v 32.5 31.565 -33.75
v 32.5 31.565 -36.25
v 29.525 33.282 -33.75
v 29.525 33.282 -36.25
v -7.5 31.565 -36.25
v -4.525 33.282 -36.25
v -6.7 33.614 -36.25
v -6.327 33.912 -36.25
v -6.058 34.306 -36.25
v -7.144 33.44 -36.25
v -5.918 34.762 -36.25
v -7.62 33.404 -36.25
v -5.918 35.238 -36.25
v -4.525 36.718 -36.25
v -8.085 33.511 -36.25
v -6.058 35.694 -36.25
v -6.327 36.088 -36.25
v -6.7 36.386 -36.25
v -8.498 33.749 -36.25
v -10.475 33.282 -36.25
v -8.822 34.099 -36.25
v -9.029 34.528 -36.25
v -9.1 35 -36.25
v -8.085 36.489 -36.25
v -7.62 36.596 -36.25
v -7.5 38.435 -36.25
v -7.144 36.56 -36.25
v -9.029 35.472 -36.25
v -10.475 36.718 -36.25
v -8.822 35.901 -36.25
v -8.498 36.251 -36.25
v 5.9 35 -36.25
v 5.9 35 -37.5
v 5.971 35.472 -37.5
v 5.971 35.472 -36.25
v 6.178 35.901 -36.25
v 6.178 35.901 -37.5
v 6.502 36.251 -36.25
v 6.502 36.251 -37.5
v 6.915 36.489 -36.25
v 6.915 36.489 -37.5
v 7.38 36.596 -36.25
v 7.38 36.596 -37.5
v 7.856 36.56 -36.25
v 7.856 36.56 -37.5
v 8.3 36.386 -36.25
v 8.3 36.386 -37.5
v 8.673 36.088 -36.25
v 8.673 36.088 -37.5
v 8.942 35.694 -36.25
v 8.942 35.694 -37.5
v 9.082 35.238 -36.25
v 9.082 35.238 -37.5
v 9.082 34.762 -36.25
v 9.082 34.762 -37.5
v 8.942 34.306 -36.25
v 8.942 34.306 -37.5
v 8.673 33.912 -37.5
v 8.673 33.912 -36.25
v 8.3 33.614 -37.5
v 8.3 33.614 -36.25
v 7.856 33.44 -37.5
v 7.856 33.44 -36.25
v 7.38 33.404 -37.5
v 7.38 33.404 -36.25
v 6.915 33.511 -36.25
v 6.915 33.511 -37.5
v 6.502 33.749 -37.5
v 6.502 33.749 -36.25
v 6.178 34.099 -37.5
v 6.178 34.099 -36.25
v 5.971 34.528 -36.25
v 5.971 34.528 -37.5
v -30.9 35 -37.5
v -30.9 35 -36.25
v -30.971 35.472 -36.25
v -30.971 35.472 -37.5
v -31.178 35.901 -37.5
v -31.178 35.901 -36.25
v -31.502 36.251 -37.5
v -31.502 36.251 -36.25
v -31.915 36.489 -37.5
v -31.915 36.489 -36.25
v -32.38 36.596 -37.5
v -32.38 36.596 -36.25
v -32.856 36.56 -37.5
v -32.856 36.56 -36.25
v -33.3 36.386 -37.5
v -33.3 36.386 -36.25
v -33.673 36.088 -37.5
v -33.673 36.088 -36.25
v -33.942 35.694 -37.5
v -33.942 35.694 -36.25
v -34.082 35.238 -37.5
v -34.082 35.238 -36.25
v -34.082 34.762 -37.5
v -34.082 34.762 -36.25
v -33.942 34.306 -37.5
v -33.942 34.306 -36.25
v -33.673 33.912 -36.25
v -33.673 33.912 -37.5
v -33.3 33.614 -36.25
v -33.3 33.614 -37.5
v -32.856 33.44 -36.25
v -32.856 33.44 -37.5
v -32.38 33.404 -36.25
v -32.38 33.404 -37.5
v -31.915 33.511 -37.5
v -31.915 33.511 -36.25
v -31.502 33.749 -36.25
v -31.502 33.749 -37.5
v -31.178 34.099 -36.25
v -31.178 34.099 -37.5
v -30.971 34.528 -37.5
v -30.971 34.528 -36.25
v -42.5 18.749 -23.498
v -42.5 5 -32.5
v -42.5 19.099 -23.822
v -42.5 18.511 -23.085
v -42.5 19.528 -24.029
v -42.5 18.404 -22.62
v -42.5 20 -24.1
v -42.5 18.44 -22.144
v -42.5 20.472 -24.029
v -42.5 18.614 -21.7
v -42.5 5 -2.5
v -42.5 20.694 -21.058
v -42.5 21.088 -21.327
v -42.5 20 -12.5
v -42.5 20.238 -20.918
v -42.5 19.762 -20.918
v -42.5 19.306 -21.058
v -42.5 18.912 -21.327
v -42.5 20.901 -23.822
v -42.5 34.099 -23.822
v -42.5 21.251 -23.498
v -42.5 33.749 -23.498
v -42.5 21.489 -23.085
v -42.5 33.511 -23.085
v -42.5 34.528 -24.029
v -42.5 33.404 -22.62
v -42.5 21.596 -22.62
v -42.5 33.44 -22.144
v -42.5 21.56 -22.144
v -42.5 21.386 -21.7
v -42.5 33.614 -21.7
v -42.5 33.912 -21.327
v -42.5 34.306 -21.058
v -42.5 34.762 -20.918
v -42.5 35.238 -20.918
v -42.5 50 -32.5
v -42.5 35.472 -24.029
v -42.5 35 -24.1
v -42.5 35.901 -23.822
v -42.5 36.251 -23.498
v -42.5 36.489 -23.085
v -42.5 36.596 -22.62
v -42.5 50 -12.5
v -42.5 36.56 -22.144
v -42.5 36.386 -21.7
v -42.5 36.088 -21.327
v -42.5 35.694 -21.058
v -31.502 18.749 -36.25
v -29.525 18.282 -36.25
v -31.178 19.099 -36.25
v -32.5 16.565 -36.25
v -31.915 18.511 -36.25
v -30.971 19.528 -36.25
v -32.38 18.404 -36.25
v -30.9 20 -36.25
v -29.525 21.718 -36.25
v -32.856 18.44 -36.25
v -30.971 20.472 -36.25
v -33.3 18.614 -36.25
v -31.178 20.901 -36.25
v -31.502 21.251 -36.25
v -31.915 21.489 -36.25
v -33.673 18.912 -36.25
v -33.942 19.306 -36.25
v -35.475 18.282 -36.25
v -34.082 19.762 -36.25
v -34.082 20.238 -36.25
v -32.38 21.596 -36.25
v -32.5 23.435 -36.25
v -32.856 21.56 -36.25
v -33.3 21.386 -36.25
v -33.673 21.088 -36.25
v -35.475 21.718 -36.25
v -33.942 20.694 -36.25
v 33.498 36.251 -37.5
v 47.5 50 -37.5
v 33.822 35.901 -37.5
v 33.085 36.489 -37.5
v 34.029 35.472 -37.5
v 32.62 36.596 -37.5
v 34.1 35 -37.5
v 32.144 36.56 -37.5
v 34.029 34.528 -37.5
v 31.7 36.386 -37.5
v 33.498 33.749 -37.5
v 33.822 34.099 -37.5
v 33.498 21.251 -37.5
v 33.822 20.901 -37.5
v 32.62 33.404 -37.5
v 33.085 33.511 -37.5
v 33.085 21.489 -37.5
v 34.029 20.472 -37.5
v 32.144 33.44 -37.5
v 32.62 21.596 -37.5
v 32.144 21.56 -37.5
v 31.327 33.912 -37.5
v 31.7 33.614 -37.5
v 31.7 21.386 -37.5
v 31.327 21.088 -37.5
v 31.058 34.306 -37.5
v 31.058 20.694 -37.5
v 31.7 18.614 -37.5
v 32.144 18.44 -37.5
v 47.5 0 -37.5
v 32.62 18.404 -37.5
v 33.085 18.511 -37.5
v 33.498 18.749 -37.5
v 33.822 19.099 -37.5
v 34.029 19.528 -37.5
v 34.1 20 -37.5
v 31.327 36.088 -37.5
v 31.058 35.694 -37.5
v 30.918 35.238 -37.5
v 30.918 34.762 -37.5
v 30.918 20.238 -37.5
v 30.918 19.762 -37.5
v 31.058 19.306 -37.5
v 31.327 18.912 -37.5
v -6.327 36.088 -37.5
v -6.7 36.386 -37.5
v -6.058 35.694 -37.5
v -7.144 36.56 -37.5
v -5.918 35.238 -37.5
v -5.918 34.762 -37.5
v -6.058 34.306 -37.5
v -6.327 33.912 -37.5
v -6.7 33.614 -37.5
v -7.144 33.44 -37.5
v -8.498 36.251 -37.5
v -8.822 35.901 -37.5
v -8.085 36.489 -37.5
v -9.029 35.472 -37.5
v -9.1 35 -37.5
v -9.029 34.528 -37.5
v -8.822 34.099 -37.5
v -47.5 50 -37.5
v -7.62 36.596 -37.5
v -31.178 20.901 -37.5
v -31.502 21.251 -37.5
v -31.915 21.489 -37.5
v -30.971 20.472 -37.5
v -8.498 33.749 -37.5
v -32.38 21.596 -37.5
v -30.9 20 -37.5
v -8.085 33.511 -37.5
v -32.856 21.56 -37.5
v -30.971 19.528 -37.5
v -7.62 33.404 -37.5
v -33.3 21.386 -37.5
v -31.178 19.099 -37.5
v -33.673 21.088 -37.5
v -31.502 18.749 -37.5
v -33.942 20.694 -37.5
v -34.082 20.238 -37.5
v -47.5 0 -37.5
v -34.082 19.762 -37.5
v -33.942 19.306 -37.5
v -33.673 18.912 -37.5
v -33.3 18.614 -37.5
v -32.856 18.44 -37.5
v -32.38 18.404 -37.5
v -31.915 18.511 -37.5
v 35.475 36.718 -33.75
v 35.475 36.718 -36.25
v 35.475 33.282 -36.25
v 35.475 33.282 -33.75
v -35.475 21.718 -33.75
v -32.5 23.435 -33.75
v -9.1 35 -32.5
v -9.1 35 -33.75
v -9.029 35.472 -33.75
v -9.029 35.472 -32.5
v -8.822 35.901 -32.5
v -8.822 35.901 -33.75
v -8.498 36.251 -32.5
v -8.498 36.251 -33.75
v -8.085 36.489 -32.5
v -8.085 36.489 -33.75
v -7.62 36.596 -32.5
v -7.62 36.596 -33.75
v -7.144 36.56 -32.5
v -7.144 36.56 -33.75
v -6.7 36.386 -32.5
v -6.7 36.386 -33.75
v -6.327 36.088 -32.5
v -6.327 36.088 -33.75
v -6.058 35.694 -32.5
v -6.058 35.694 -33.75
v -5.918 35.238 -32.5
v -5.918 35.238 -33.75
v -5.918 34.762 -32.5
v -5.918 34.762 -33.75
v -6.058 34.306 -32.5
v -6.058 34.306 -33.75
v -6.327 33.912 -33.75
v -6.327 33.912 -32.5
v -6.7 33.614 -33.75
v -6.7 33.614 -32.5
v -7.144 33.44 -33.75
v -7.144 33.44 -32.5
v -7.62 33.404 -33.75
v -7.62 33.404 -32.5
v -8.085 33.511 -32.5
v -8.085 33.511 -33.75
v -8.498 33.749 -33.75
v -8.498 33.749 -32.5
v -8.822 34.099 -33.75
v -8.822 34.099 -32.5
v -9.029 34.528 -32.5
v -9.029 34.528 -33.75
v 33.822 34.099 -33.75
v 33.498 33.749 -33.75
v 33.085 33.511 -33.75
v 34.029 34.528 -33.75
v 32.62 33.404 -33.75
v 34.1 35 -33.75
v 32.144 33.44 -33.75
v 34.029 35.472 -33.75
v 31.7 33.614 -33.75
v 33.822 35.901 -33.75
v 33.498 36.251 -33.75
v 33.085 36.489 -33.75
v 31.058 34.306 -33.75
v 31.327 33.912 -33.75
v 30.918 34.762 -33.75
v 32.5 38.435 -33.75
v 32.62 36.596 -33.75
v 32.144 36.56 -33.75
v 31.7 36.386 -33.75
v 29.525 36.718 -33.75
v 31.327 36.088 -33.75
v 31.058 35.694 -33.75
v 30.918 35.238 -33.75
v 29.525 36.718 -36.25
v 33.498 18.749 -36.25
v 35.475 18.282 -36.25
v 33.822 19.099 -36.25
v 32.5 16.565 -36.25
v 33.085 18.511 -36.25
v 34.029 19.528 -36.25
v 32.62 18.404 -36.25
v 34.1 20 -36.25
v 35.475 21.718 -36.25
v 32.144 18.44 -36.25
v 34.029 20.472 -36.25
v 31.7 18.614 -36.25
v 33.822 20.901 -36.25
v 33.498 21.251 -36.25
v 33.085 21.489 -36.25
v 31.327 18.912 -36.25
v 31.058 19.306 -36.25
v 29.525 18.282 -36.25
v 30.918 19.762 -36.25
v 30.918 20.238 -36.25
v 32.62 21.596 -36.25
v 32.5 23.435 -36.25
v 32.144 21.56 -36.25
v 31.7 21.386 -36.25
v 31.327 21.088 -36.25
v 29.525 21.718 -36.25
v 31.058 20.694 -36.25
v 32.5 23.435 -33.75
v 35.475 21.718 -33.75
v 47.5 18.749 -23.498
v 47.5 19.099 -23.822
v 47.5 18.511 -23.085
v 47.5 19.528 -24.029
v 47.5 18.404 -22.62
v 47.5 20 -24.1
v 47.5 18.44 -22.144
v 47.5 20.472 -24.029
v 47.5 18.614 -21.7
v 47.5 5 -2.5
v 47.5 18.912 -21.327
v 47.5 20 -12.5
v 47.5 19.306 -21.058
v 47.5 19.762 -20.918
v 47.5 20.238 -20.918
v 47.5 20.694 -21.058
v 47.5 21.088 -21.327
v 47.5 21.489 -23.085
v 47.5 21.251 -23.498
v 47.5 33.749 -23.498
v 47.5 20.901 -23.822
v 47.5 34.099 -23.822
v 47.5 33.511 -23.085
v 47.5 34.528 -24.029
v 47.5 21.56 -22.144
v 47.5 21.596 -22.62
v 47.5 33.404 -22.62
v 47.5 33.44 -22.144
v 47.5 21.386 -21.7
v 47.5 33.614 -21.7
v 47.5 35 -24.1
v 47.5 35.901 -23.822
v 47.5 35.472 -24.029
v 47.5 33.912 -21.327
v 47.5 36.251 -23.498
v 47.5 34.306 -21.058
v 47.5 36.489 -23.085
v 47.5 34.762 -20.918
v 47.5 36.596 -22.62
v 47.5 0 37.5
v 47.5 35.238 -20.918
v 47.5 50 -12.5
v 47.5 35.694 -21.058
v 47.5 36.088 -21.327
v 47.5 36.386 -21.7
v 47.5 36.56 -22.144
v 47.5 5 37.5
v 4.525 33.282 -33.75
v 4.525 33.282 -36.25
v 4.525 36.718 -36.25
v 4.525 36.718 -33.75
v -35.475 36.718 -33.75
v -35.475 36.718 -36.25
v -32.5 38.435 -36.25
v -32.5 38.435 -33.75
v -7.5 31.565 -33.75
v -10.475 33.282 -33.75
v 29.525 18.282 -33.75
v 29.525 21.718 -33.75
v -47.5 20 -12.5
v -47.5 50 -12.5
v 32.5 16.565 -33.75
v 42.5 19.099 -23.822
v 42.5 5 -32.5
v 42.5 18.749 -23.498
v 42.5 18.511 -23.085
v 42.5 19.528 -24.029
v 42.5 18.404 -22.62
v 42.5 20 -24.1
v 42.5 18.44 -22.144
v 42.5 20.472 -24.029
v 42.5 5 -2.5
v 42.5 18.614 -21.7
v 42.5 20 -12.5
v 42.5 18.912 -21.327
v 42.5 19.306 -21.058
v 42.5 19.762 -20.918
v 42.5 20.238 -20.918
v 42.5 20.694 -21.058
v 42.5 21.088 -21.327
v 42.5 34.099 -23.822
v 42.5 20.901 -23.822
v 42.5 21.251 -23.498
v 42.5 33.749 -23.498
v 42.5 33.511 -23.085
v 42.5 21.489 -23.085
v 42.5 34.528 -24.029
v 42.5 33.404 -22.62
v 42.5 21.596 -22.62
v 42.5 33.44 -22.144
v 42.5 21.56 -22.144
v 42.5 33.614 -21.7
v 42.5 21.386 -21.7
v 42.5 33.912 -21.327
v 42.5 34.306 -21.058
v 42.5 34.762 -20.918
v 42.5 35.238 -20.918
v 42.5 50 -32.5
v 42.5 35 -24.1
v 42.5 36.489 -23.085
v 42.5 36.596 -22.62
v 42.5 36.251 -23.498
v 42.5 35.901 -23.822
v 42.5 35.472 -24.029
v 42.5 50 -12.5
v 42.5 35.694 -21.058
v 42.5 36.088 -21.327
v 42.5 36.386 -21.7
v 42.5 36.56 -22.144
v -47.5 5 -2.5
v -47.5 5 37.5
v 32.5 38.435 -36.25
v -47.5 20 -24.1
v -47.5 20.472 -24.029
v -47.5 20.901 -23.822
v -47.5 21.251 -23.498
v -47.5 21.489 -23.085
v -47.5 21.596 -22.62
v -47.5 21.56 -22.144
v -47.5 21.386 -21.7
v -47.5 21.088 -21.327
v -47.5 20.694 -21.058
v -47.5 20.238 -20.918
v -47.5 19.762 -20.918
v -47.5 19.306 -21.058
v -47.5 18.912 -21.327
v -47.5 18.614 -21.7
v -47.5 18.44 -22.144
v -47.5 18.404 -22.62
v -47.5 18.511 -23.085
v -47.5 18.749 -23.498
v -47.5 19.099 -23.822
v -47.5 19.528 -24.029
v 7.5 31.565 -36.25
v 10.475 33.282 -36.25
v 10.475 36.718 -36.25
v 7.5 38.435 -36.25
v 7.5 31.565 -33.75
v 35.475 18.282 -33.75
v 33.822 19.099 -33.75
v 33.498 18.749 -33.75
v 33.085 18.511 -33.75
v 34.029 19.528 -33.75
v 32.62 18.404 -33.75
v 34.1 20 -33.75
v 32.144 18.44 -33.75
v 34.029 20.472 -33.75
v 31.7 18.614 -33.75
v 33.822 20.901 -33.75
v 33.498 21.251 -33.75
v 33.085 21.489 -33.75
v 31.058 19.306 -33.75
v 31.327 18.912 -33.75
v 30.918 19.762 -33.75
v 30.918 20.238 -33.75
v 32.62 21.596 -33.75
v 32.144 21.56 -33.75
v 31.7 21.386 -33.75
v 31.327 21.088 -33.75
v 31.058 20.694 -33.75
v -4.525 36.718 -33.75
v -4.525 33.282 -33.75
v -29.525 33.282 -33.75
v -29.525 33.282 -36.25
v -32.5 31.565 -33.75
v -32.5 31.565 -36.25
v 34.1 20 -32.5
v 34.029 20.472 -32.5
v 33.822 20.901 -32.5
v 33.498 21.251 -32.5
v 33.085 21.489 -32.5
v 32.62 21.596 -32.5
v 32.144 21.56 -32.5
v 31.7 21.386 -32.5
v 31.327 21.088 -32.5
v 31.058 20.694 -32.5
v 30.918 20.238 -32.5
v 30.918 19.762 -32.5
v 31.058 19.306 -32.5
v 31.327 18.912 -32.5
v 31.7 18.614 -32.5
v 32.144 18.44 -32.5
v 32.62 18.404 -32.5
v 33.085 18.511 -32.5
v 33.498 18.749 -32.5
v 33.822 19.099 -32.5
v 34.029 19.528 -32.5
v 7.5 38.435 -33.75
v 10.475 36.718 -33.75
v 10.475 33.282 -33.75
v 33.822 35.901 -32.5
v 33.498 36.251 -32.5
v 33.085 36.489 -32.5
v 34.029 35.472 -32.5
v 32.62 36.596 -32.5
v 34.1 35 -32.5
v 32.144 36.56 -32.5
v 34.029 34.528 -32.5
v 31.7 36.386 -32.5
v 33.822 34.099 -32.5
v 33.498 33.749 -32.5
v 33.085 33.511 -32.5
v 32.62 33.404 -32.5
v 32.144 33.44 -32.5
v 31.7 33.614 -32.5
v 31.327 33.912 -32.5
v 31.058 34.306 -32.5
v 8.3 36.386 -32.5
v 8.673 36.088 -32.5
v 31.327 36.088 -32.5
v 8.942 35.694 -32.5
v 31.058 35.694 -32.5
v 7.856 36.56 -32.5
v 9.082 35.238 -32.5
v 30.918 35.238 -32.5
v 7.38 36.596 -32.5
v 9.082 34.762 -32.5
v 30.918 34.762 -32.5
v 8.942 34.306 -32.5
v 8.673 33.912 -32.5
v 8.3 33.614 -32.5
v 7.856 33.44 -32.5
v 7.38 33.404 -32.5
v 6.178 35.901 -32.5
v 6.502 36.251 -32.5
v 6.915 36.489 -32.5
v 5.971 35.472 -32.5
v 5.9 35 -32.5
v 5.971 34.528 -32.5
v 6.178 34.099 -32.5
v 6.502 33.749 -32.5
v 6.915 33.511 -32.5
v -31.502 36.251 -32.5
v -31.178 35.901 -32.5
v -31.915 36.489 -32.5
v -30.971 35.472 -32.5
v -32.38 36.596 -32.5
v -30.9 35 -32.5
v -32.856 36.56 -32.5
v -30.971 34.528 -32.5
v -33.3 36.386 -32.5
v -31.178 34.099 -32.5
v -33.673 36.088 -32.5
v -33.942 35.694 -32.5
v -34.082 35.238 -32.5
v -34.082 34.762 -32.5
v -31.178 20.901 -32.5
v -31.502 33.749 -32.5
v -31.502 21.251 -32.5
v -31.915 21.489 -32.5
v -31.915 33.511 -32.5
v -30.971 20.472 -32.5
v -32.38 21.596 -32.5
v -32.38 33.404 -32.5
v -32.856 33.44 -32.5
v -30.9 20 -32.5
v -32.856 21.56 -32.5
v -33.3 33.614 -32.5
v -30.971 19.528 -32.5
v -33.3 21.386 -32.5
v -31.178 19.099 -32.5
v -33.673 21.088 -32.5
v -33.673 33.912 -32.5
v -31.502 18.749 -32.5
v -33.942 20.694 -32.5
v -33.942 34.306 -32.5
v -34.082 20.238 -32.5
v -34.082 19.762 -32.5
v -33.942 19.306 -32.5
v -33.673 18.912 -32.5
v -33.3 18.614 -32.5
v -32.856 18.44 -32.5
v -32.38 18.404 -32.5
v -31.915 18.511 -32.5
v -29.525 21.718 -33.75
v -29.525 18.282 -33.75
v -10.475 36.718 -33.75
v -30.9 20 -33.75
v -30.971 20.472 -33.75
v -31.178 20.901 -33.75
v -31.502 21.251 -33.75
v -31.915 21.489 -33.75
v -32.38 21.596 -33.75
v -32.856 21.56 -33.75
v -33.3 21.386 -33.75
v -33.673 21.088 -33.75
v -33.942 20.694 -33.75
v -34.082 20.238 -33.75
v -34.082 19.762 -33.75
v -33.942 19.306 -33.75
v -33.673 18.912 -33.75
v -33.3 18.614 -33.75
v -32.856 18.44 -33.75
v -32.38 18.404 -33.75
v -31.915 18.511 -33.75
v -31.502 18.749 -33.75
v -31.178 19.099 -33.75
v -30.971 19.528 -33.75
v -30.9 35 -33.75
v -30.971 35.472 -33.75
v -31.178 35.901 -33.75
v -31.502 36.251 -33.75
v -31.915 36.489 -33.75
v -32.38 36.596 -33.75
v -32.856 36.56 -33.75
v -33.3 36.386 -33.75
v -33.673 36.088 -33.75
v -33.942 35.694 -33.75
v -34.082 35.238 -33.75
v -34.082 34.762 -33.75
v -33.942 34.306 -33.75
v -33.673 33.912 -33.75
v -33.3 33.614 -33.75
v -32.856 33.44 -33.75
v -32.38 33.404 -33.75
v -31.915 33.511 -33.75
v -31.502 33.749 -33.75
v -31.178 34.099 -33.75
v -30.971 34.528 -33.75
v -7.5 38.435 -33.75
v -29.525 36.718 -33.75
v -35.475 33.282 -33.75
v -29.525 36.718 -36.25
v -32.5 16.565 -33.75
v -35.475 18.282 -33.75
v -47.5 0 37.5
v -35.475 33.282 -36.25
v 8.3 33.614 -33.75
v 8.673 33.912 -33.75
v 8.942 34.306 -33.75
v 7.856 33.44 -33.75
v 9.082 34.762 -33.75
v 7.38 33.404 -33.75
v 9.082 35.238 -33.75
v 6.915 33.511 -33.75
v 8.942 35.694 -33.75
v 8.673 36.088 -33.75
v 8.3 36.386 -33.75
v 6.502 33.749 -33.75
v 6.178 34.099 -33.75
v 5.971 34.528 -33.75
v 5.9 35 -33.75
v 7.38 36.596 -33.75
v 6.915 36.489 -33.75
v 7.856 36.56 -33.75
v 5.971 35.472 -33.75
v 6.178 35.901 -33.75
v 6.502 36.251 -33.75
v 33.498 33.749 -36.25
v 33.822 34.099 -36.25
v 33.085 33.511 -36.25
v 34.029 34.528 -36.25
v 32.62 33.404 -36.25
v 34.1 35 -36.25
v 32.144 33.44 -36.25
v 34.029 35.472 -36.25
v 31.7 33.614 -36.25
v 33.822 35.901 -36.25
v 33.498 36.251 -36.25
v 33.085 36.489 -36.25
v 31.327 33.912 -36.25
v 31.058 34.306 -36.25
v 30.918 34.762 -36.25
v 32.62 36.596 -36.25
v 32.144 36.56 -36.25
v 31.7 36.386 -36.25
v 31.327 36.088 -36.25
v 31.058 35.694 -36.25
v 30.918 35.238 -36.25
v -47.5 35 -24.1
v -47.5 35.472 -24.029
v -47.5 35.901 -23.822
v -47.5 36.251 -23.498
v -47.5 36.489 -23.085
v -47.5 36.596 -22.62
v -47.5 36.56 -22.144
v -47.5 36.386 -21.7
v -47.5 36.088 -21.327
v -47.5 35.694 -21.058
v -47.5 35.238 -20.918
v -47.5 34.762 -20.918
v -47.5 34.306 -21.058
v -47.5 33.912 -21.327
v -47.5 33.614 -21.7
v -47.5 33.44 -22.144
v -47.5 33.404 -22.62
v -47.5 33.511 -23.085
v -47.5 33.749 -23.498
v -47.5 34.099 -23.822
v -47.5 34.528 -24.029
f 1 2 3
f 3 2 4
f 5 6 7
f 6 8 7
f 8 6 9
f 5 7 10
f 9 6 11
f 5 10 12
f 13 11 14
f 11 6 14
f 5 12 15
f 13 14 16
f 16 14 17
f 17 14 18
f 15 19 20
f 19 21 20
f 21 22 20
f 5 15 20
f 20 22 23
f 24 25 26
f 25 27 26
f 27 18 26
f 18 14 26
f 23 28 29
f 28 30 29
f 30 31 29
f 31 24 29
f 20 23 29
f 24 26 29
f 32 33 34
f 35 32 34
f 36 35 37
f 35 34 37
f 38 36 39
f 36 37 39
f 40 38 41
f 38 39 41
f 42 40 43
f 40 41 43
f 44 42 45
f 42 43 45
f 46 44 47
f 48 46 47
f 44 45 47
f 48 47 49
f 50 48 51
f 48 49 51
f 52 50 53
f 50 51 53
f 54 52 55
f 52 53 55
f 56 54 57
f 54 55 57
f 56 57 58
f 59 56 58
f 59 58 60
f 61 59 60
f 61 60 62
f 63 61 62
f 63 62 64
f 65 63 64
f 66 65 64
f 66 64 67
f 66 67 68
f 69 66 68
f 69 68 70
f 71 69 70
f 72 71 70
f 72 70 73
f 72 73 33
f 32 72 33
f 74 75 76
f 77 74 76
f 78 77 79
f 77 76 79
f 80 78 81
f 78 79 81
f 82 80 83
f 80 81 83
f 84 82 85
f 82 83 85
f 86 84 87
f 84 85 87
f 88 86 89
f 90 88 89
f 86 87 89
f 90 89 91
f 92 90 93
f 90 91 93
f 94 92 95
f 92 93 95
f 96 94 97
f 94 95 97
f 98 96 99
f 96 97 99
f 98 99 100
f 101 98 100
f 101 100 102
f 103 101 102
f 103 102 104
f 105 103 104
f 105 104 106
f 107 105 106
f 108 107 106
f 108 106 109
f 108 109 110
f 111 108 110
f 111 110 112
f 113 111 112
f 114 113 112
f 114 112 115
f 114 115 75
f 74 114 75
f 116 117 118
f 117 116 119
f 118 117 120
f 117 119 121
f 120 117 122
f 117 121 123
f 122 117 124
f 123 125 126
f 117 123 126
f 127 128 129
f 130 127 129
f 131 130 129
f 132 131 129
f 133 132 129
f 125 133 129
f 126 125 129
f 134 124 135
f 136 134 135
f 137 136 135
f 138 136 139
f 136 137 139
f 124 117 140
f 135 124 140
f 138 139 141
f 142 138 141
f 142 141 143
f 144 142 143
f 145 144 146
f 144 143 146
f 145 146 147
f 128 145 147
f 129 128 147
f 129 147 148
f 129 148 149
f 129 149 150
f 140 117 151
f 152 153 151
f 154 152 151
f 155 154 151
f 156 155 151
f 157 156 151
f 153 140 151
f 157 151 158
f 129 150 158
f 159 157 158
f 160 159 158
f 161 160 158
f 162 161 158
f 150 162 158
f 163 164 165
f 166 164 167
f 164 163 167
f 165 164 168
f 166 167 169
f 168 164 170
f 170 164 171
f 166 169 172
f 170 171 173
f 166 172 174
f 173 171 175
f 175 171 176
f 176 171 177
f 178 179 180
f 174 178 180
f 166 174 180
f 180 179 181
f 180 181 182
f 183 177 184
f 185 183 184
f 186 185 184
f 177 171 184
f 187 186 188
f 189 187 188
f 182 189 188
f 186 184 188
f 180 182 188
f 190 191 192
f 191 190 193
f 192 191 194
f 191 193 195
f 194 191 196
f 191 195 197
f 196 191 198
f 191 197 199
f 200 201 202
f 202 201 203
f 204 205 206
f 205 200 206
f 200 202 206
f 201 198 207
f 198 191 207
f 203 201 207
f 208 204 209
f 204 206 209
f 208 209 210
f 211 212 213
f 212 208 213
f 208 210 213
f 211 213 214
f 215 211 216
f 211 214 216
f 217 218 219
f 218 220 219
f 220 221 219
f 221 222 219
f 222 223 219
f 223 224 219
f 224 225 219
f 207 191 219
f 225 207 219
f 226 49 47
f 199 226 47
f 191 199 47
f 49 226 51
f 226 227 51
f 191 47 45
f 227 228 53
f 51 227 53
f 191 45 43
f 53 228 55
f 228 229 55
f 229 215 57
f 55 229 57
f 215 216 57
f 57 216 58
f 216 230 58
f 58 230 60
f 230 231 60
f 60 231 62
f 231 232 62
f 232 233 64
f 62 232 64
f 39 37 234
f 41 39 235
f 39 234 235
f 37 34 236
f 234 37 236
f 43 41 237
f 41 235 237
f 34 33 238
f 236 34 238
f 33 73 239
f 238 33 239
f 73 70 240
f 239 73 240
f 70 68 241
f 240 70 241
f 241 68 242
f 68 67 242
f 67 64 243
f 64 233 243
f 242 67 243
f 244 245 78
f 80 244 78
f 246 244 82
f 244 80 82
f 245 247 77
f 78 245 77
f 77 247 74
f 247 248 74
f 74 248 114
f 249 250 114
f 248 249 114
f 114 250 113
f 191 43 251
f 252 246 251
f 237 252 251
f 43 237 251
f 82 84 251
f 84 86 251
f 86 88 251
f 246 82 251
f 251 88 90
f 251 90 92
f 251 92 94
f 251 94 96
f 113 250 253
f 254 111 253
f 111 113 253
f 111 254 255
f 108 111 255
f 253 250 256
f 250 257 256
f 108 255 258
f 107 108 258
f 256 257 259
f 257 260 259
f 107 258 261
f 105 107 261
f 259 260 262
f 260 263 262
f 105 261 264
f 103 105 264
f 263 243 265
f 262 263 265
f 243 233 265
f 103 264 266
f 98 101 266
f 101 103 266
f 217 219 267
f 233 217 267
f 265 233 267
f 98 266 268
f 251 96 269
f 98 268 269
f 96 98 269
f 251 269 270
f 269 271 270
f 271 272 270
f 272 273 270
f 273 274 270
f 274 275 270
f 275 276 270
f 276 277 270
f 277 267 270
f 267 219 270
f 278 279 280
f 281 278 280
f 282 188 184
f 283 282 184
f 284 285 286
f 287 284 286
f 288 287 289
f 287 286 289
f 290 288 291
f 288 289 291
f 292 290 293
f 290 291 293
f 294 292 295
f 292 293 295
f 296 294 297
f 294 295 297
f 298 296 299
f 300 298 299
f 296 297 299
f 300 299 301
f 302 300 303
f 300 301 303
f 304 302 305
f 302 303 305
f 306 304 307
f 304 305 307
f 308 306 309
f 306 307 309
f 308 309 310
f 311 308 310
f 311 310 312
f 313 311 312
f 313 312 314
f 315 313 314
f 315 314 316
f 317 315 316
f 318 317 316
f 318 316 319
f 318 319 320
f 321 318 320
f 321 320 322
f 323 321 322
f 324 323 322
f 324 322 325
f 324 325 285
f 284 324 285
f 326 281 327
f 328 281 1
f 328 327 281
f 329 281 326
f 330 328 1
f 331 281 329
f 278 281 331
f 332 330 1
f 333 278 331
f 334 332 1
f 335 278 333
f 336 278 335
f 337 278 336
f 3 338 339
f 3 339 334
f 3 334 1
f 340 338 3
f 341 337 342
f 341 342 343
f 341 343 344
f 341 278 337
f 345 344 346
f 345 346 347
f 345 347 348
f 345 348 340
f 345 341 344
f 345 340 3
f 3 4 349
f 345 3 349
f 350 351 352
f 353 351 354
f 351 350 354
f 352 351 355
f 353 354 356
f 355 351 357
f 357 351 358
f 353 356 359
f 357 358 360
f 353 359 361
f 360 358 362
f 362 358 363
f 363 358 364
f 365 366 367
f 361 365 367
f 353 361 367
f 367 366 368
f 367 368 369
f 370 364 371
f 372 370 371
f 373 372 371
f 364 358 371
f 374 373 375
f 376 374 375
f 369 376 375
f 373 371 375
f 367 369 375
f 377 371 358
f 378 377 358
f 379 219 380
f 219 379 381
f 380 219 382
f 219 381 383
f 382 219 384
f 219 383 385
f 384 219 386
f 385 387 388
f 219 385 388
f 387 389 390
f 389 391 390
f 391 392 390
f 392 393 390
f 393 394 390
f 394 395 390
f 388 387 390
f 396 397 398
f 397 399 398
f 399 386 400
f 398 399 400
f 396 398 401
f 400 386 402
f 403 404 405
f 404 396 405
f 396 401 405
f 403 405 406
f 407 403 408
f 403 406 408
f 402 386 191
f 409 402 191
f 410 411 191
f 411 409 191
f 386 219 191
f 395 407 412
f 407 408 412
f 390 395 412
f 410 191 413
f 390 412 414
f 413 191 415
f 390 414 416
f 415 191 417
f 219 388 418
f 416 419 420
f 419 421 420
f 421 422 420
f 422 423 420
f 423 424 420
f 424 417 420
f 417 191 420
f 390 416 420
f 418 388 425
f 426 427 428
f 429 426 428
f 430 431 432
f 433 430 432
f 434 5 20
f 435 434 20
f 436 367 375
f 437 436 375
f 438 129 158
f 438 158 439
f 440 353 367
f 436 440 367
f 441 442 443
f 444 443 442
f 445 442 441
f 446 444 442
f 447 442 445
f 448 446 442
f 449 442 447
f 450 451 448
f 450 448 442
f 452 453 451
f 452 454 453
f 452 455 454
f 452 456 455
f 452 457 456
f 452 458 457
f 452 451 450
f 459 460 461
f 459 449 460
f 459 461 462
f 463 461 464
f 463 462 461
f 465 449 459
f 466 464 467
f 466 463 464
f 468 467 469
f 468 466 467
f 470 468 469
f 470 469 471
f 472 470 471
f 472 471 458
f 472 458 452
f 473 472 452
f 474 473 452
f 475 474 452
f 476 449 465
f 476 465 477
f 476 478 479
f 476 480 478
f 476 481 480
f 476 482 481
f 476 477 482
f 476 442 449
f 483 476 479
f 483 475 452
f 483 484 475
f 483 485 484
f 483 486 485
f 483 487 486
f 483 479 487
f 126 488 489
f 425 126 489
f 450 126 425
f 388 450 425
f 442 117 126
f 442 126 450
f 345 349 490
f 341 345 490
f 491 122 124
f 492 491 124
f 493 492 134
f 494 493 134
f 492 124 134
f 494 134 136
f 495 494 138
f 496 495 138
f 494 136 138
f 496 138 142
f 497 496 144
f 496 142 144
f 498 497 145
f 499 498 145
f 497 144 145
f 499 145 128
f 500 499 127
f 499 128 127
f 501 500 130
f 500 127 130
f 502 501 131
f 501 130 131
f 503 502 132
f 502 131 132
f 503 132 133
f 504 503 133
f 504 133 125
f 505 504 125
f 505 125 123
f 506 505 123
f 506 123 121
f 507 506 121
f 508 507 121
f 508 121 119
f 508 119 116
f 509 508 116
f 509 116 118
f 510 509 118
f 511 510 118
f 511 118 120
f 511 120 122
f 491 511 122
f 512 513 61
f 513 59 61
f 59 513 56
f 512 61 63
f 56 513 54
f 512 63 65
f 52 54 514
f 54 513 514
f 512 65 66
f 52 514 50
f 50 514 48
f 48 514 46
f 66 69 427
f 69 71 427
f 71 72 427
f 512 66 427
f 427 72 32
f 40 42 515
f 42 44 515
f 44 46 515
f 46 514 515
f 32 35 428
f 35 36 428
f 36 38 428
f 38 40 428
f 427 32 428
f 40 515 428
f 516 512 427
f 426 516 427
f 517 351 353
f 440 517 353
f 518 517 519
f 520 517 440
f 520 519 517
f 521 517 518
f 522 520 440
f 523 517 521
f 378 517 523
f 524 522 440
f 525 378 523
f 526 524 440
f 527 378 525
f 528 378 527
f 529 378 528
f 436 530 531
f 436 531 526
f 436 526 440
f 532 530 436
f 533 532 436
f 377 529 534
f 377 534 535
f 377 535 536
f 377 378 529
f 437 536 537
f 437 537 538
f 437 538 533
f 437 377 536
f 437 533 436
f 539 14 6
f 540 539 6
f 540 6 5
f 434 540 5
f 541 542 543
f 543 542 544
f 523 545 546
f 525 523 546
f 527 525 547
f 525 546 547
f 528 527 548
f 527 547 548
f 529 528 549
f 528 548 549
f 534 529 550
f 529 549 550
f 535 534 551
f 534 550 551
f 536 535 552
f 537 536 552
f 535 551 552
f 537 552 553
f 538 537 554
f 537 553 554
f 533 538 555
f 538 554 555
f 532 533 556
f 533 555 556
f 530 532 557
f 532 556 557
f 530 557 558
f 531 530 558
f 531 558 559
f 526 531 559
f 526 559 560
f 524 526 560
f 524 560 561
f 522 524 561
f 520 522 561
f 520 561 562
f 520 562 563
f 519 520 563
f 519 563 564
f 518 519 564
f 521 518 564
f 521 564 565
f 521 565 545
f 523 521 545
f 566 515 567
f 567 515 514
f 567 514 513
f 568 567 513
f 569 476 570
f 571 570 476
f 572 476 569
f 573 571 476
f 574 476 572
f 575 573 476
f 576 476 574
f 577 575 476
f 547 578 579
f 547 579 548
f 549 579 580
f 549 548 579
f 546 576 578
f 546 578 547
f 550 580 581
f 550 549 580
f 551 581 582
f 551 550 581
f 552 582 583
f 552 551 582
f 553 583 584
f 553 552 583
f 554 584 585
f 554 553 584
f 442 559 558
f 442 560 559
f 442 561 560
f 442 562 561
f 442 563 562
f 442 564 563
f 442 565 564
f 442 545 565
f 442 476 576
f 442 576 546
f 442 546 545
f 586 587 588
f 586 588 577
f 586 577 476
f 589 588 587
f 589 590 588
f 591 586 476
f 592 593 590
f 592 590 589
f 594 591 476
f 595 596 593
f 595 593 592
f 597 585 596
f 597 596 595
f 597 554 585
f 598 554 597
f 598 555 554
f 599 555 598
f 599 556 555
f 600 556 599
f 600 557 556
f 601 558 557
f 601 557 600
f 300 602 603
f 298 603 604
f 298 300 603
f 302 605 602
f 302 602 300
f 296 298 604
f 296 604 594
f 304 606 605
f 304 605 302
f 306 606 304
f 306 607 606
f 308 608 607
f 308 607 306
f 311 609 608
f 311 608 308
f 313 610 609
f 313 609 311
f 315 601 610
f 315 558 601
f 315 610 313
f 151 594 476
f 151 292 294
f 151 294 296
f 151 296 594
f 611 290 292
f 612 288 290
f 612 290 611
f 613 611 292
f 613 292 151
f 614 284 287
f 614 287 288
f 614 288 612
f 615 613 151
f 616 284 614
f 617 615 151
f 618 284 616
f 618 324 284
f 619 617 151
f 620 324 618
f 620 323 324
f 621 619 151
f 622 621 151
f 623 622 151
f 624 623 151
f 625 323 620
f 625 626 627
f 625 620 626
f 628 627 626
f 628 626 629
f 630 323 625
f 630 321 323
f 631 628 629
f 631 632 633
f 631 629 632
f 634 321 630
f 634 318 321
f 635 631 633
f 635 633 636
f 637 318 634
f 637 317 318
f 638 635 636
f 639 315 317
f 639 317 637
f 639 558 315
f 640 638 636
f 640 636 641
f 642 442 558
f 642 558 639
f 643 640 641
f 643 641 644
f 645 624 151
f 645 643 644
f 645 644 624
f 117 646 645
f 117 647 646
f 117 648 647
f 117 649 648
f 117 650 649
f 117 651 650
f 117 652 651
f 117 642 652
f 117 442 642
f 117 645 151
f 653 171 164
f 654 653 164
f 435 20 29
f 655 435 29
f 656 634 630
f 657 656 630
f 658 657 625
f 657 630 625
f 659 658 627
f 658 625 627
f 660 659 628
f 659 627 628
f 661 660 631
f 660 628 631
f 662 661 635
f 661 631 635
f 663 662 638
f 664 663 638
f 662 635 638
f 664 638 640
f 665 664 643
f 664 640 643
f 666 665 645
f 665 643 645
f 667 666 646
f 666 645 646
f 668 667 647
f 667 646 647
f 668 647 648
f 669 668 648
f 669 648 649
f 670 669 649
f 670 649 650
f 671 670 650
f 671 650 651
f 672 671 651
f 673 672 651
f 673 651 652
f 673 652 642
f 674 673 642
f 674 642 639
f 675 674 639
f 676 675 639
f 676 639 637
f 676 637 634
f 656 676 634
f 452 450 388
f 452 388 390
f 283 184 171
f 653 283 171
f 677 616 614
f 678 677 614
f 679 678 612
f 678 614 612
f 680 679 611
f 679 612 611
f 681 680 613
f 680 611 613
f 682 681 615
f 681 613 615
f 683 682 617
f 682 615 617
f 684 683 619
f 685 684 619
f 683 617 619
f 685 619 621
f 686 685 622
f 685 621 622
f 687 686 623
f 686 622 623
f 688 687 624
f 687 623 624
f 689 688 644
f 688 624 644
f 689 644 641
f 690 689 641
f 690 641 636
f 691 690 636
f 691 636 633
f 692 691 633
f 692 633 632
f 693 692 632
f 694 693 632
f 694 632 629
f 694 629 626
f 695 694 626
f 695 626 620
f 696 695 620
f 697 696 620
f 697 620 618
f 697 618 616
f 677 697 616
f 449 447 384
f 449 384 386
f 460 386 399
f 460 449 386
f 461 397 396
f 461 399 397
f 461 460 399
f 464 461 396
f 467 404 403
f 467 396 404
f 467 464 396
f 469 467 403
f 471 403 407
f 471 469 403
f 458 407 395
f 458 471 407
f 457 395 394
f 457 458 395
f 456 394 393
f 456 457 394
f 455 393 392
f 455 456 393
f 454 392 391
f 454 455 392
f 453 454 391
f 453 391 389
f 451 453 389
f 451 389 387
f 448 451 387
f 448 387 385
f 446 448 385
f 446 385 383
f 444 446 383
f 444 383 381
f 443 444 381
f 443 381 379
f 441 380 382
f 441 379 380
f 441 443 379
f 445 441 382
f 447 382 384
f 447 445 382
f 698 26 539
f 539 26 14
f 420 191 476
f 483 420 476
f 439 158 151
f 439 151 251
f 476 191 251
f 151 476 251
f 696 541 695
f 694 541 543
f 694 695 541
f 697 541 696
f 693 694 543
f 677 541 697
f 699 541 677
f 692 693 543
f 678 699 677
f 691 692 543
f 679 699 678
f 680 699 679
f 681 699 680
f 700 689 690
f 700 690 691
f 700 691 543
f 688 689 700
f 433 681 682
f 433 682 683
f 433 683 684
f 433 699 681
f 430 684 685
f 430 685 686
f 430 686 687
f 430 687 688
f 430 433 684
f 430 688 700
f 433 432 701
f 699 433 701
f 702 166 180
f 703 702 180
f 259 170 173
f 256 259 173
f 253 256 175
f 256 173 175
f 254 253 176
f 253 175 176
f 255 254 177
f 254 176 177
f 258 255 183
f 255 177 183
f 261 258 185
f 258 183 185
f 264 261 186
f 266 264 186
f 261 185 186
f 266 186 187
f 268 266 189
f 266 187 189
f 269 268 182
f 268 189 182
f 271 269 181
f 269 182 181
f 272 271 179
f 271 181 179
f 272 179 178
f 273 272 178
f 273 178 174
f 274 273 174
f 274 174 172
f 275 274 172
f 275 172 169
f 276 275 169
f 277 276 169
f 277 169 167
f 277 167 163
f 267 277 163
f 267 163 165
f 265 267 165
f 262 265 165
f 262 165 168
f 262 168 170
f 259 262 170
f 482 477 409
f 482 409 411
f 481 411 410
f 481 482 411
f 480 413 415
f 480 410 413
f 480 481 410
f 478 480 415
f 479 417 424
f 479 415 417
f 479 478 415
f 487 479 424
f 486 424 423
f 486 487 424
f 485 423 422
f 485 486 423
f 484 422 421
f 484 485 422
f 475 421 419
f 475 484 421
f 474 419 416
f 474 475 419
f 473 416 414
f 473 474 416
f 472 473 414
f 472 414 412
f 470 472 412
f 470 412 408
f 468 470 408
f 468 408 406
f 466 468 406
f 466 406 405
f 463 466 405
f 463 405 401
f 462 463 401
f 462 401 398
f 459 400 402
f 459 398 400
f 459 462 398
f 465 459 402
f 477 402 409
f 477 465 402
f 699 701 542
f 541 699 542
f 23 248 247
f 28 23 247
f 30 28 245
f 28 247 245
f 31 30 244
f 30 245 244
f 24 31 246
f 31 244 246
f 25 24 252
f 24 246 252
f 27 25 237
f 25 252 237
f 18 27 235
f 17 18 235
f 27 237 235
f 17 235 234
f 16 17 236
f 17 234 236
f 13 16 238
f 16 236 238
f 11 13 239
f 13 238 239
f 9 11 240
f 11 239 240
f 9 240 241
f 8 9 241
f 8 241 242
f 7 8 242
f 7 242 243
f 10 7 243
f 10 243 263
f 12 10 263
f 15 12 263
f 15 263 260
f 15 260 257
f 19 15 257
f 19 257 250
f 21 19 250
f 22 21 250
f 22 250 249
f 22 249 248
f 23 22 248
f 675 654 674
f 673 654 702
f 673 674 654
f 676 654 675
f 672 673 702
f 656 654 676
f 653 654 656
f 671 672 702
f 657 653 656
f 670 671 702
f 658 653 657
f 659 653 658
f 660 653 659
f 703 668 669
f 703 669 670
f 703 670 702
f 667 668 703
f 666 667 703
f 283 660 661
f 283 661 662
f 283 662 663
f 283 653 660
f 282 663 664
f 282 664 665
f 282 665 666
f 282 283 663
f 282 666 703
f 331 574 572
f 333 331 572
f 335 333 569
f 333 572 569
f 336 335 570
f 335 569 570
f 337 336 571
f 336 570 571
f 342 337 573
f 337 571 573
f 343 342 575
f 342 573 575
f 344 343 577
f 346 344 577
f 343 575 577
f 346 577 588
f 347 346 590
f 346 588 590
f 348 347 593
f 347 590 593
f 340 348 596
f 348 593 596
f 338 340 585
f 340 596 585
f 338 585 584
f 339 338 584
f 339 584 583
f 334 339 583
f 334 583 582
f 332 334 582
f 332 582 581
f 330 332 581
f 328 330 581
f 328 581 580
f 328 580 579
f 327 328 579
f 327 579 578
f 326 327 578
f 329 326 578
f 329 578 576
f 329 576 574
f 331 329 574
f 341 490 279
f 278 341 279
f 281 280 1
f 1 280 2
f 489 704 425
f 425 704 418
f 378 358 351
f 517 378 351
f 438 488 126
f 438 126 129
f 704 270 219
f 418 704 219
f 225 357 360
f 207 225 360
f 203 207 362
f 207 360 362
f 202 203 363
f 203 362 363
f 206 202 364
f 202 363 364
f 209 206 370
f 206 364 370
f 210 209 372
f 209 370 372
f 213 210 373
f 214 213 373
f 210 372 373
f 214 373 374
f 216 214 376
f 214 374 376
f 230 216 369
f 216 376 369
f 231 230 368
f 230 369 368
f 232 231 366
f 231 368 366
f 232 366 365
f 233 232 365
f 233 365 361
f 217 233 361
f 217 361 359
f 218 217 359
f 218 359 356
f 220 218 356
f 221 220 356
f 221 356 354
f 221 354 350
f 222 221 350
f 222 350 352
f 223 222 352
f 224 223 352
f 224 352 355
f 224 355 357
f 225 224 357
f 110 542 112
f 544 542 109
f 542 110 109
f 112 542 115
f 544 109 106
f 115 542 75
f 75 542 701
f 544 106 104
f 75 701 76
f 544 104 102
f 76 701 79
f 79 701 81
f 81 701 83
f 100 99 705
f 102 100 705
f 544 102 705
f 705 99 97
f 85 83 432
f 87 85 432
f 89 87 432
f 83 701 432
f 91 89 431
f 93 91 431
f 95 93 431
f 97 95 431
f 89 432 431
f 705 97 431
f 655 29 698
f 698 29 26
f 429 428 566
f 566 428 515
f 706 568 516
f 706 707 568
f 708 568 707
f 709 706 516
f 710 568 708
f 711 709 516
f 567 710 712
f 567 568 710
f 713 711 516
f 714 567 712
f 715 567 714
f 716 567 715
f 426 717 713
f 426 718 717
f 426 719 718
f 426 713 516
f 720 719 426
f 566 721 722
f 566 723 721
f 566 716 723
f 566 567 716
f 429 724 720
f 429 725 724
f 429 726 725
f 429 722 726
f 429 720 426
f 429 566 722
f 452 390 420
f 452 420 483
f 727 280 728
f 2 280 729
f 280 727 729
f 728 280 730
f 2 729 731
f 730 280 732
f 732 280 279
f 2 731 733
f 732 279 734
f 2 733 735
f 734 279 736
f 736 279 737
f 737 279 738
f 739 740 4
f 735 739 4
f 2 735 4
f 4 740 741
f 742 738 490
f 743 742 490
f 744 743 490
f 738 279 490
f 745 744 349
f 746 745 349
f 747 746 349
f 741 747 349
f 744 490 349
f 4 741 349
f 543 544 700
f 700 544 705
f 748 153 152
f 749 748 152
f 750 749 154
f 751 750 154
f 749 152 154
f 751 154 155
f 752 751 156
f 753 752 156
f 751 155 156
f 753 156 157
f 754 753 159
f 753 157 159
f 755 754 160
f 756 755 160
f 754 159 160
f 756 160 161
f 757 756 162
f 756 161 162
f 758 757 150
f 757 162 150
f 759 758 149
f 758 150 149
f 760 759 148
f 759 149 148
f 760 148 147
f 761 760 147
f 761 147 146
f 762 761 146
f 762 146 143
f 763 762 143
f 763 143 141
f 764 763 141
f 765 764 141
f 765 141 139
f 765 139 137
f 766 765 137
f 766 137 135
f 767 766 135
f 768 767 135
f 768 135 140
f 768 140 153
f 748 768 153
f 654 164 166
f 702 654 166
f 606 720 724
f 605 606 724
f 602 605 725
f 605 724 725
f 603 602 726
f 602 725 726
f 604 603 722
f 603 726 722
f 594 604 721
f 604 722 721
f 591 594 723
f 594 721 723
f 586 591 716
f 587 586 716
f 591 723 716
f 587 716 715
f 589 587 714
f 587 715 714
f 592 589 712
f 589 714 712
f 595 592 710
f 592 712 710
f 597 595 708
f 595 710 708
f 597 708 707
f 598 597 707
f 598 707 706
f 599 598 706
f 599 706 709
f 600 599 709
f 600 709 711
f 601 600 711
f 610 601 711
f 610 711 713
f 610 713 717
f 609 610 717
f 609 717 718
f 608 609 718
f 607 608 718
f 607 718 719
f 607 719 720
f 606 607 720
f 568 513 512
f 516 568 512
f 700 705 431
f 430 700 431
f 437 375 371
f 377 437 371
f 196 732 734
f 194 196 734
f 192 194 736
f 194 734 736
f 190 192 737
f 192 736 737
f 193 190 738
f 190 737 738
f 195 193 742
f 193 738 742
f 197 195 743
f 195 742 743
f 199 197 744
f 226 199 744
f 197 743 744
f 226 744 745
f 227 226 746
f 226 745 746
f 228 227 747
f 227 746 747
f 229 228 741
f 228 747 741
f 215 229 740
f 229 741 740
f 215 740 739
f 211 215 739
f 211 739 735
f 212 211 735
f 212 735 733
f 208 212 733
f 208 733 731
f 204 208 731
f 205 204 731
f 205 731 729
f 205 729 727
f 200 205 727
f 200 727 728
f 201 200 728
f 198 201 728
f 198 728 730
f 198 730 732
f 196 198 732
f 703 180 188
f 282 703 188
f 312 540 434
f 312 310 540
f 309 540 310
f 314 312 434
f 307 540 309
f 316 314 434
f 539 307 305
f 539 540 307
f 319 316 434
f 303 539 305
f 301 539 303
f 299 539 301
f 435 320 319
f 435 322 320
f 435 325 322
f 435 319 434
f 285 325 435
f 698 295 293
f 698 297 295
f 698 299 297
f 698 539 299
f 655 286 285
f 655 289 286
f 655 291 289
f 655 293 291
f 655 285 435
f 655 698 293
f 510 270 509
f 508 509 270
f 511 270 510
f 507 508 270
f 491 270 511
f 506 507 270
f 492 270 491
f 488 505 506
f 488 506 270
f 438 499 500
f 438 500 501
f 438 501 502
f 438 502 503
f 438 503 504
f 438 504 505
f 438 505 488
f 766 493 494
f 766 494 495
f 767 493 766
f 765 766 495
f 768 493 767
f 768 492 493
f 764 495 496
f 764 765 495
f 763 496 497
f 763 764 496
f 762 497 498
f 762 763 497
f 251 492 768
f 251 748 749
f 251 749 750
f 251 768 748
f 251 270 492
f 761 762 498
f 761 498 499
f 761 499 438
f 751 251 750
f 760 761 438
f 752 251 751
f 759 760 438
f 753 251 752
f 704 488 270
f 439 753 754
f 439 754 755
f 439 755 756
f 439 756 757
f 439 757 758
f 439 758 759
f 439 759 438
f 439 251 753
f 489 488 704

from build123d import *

# Parameters (mm, degrees)
SKETCH1_W               = 95
SKETCH1_H               = 75
BOSS_EXTRUDE1_DEPTH     = 5
BOSS_EXTRUDE4_DEPTH     = 45
SKETCH5_R               = 1.6
CUT_EXTRUDE1_DEPTH      = 91
CUT_EXTRUDE1_DEPTH_BACK = 6
CUT_EXTRUDE2_REACH      = 7
SKETCH6_R               = 1.6
BOSS_EXTRUDE5_DEPTH     = 5
BOSS_EXTRUDE6_START     = -90
BOSS_EXTRUDE6_DEPTH     = 5
CUT_EXTRUDE3_REACH      = 77
SKETCH8_R               = 1.6
CUT_EXTRUDE4_START      = -1.25
CUT_EXTRUDE4_DEPTH      = 2.5


with BuildPart() as part:
    # Sketch1 → Boss-Extrude1 (new body)
    with BuildSketch(Plane(origin=(0, 0, 0), x_dir=(1, 0, 0), z_dir=(0, 1, 0))):
        Rectangle(SKETCH1_W, SKETCH1_H)
    extrude(amount=BOSS_EXTRUDE1_DEPTH)

    # Sketch4 → Boss-Extrude4 (add)
    with BuildSketch(Plane(origin=(0, 5, 0), x_dir=(1, 0, 0), z_dir=(0, 1, 0))):
        Polygon((-47.5, 37.5), (-42.5, 37.5), (42.5, 37.5), (47.5, 37.5), (47.5, 12.5), (42.5, 12.5), (42.5, 32.5), (-42.5, 32.5), (-42.5, 12.5), (-47.5, 12.5), align=None)
    extrude(amount=BOSS_EXTRUDE4_DEPTH)

    # Sketch5 → Cut-Extrude1 (cut, two sides)
    with BuildSketch(Plane(origin=(-42.5, 0, 0), x_dir=(0, 0, -1), z_dir=(1, 0, 0))) as cut_extrude1_sk:
        with Locations((22.5, 35)):
            Circle(SKETCH5_R)
        with Locations((22.5, 20)):
            Circle(SKETCH5_R)
    extrude(amount=CUT_EXTRUDE1_DEPTH, mode=Mode.SUBTRACT)
    extrude(cut_extrude1_sk.sketch, amount=-CUT_EXTRUDE1_DEPTH_BACK, mode=Mode.SUBTRACT)

    # Sketch6 → Cut-Extrude2 (cut, up to next)
    with BuildSketch(Plane.XY.offset(-32.5), mode=Mode.PRIVATE) as cut_extrude2_sk1:
        with Locations((-32.5, 35)):
            Circle(SKETCH6_R)
    cut_extrude2_tool1 = extrude(cut_extrude2_sk1.sketch, amount=-CUT_EXTRUDE2_REACH, mode=Mode.PRIVATE) & part.part
    add(cut_extrude2_tool1.solids().sort_by_distance((-32.5, 35, -32.5))[0], mode=Mode.SUBTRACT)
    # Sketch6 → Cut-Extrude2 (cut, up to next)
    with BuildSketch(Plane.XY.offset(-32.5), mode=Mode.PRIVATE) as cut_extrude2_sk2:
        with Locations((-32.5, 20)):
            Circle(SKETCH6_R)
    cut_extrude2_tool2 = extrude(cut_extrude2_sk2.sketch, amount=-CUT_EXTRUDE2_REACH, mode=Mode.PRIVATE) & part.part
    add(cut_extrude2_tool2.solids().sort_by_distance((-32.5, 20, -32.5))[0], mode=Mode.SUBTRACT)
    # Sketch6 → Cut-Extrude2 (cut, up to next)
    with BuildSketch(Plane.XY.offset(-32.5), mode=Mode.PRIVATE) as cut_extrude2_sk3:
        with Locations((32.5, 20)):
            Circle(SKETCH6_R)
    cut_extrude2_tool3 = extrude(cut_extrude2_sk3.sketch, amount=-CUT_EXTRUDE2_REACH, mode=Mode.PRIVATE) & part.part
    add(cut_extrude2_tool3.solids().sort_by_distance((32.5, 20, -32.5))[0], mode=Mode.SUBTRACT)
    # Sketch6 → Cut-Extrude2 (cut, up to next)
    with BuildSketch(Plane.XY.offset(-32.5), mode=Mode.PRIVATE) as cut_extrude2_sk4:
        with Locations((32.5, 35)):
            Circle(SKETCH6_R)
    cut_extrude2_tool4 = extrude(cut_extrude2_sk4.sketch, amount=-CUT_EXTRUDE2_REACH, mode=Mode.PRIVATE) & part.part
    add(cut_extrude2_tool4.solids().sort_by_distance((32.5, 35, -32.5))[0], mode=Mode.SUBTRACT)

    # Sketch7 → Boss-Extrude5 (add)
    with BuildSketch(Plane.ZY.offset(47.5)):
        Polygon((-12.5, 5), (-2.5, 5), (-12.5, 20), align=None)
    extrude(amount=-BOSS_EXTRUDE5_DEPTH)

    # Sketch7<2> → Boss-Extrude6 (add)
    with BuildSketch(Plane.ZY.offset(47.5).offset(BOSS_EXTRUDE6_START)):
        Polygon((-12.5, 5), (-2.5, 5), (-12.5, 20), align=None)
    extrude(amount=-BOSS_EXTRUDE6_DEPTH)

    # Sketch8 → Cut-Extrude3 (cut, up to next)
    with BuildSketch(Plane(origin=(0, 0, -37.5), x_dir=(-1, 0, 0), z_dir=(0, 0, -1)), mode=Mode.PRIVATE) as cut_extrude3_sk1:
        with Locations((-7.5, 35)):
            Circle(SKETCH8_R)
    cut_extrude3_tool1 = extrude(cut_extrude3_sk1.sketch, amount=-CUT_EXTRUDE3_REACH, mode=Mode.PRIVATE) & part.part
    add(cut_extrude3_tool1.solids().sort_by_distance((7.5, 35, -37.5))[0], mode=Mode.SUBTRACT)
    # Sketch8 → Cut-Extrude3 (cut, up to next)
    with BuildSketch(Plane(origin=(0, 0, -37.5), x_dir=(-1, 0, 0), z_dir=(0, 0, -1)), mode=Mode.PRIVATE) as cut_extrude3_sk2:
        with Locations((7.5, 35)):
            Circle(SKETCH8_R)
    cut_extrude3_tool2 = extrude(cut_extrude3_sk2.sketch, amount=-CUT_EXTRUDE3_REACH, mode=Mode.PRIVATE) & part.part
    add(cut_extrude3_tool2.solids().sort_by_distance((-7.5, 35, -37.5))[0], mode=Mode.SUBTRACT)

    # Sketch9 → Cut-Extrude4 (cut)
    with BuildSketch(Plane(origin=(0, 0, -37.5), x_dir=(-1, 0, 0), z_dir=(0, 0, -1)).offset(CUT_EXTRUDE4_START)):
        Polygon((-32.5, 38.435234102), (-35.475, 36.717617051), (-35.475, 33.282382949), (-32.5, 31.564765898), (-29.525, 33.282382949), (-29.525, 36.717617051), align=None)
        Polygon((-7.5, 38.435234102), (-10.475, 36.717617051), (-10.475, 33.282382949), (-7.5, 31.564765898), (-4.525, 33.282382949), (-4.525, 36.717617051), align=None)
        Polygon((7.5, 38.435234102), (4.525, 36.717617051), (4.525, 33.282382949), (7.5, 31.564765898), (10.475, 33.282382949), (10.475, 36.717617051), align=None)
        Polygon((32.5, 38.435234102), (29.525, 36.717617051), (29.525, 33.282382949), (32.5, 31.564765898), (35.475, 33.282382949), (35.475, 36.717617051), align=None)
        Polygon((32.5, 23.435234102), (29.525, 21.717617051), (29.525, 18.282382949), (32.5, 16.564765898), (35.475, 18.282382949), (35.475, 21.717617051), align=None)
        Polygon((-32.5, 23.435234102), (-35.475, 21.717617051), (-35.475, 18.282382949), (-32.5, 16.564765898), (-29.525, 18.282382949), (-29.525, 21.717617051), align=None)
    extrude(amount=-CUT_EXTRUDE4_DEPTH, mode=Mode.SUBTRACT)


solid = part.part
